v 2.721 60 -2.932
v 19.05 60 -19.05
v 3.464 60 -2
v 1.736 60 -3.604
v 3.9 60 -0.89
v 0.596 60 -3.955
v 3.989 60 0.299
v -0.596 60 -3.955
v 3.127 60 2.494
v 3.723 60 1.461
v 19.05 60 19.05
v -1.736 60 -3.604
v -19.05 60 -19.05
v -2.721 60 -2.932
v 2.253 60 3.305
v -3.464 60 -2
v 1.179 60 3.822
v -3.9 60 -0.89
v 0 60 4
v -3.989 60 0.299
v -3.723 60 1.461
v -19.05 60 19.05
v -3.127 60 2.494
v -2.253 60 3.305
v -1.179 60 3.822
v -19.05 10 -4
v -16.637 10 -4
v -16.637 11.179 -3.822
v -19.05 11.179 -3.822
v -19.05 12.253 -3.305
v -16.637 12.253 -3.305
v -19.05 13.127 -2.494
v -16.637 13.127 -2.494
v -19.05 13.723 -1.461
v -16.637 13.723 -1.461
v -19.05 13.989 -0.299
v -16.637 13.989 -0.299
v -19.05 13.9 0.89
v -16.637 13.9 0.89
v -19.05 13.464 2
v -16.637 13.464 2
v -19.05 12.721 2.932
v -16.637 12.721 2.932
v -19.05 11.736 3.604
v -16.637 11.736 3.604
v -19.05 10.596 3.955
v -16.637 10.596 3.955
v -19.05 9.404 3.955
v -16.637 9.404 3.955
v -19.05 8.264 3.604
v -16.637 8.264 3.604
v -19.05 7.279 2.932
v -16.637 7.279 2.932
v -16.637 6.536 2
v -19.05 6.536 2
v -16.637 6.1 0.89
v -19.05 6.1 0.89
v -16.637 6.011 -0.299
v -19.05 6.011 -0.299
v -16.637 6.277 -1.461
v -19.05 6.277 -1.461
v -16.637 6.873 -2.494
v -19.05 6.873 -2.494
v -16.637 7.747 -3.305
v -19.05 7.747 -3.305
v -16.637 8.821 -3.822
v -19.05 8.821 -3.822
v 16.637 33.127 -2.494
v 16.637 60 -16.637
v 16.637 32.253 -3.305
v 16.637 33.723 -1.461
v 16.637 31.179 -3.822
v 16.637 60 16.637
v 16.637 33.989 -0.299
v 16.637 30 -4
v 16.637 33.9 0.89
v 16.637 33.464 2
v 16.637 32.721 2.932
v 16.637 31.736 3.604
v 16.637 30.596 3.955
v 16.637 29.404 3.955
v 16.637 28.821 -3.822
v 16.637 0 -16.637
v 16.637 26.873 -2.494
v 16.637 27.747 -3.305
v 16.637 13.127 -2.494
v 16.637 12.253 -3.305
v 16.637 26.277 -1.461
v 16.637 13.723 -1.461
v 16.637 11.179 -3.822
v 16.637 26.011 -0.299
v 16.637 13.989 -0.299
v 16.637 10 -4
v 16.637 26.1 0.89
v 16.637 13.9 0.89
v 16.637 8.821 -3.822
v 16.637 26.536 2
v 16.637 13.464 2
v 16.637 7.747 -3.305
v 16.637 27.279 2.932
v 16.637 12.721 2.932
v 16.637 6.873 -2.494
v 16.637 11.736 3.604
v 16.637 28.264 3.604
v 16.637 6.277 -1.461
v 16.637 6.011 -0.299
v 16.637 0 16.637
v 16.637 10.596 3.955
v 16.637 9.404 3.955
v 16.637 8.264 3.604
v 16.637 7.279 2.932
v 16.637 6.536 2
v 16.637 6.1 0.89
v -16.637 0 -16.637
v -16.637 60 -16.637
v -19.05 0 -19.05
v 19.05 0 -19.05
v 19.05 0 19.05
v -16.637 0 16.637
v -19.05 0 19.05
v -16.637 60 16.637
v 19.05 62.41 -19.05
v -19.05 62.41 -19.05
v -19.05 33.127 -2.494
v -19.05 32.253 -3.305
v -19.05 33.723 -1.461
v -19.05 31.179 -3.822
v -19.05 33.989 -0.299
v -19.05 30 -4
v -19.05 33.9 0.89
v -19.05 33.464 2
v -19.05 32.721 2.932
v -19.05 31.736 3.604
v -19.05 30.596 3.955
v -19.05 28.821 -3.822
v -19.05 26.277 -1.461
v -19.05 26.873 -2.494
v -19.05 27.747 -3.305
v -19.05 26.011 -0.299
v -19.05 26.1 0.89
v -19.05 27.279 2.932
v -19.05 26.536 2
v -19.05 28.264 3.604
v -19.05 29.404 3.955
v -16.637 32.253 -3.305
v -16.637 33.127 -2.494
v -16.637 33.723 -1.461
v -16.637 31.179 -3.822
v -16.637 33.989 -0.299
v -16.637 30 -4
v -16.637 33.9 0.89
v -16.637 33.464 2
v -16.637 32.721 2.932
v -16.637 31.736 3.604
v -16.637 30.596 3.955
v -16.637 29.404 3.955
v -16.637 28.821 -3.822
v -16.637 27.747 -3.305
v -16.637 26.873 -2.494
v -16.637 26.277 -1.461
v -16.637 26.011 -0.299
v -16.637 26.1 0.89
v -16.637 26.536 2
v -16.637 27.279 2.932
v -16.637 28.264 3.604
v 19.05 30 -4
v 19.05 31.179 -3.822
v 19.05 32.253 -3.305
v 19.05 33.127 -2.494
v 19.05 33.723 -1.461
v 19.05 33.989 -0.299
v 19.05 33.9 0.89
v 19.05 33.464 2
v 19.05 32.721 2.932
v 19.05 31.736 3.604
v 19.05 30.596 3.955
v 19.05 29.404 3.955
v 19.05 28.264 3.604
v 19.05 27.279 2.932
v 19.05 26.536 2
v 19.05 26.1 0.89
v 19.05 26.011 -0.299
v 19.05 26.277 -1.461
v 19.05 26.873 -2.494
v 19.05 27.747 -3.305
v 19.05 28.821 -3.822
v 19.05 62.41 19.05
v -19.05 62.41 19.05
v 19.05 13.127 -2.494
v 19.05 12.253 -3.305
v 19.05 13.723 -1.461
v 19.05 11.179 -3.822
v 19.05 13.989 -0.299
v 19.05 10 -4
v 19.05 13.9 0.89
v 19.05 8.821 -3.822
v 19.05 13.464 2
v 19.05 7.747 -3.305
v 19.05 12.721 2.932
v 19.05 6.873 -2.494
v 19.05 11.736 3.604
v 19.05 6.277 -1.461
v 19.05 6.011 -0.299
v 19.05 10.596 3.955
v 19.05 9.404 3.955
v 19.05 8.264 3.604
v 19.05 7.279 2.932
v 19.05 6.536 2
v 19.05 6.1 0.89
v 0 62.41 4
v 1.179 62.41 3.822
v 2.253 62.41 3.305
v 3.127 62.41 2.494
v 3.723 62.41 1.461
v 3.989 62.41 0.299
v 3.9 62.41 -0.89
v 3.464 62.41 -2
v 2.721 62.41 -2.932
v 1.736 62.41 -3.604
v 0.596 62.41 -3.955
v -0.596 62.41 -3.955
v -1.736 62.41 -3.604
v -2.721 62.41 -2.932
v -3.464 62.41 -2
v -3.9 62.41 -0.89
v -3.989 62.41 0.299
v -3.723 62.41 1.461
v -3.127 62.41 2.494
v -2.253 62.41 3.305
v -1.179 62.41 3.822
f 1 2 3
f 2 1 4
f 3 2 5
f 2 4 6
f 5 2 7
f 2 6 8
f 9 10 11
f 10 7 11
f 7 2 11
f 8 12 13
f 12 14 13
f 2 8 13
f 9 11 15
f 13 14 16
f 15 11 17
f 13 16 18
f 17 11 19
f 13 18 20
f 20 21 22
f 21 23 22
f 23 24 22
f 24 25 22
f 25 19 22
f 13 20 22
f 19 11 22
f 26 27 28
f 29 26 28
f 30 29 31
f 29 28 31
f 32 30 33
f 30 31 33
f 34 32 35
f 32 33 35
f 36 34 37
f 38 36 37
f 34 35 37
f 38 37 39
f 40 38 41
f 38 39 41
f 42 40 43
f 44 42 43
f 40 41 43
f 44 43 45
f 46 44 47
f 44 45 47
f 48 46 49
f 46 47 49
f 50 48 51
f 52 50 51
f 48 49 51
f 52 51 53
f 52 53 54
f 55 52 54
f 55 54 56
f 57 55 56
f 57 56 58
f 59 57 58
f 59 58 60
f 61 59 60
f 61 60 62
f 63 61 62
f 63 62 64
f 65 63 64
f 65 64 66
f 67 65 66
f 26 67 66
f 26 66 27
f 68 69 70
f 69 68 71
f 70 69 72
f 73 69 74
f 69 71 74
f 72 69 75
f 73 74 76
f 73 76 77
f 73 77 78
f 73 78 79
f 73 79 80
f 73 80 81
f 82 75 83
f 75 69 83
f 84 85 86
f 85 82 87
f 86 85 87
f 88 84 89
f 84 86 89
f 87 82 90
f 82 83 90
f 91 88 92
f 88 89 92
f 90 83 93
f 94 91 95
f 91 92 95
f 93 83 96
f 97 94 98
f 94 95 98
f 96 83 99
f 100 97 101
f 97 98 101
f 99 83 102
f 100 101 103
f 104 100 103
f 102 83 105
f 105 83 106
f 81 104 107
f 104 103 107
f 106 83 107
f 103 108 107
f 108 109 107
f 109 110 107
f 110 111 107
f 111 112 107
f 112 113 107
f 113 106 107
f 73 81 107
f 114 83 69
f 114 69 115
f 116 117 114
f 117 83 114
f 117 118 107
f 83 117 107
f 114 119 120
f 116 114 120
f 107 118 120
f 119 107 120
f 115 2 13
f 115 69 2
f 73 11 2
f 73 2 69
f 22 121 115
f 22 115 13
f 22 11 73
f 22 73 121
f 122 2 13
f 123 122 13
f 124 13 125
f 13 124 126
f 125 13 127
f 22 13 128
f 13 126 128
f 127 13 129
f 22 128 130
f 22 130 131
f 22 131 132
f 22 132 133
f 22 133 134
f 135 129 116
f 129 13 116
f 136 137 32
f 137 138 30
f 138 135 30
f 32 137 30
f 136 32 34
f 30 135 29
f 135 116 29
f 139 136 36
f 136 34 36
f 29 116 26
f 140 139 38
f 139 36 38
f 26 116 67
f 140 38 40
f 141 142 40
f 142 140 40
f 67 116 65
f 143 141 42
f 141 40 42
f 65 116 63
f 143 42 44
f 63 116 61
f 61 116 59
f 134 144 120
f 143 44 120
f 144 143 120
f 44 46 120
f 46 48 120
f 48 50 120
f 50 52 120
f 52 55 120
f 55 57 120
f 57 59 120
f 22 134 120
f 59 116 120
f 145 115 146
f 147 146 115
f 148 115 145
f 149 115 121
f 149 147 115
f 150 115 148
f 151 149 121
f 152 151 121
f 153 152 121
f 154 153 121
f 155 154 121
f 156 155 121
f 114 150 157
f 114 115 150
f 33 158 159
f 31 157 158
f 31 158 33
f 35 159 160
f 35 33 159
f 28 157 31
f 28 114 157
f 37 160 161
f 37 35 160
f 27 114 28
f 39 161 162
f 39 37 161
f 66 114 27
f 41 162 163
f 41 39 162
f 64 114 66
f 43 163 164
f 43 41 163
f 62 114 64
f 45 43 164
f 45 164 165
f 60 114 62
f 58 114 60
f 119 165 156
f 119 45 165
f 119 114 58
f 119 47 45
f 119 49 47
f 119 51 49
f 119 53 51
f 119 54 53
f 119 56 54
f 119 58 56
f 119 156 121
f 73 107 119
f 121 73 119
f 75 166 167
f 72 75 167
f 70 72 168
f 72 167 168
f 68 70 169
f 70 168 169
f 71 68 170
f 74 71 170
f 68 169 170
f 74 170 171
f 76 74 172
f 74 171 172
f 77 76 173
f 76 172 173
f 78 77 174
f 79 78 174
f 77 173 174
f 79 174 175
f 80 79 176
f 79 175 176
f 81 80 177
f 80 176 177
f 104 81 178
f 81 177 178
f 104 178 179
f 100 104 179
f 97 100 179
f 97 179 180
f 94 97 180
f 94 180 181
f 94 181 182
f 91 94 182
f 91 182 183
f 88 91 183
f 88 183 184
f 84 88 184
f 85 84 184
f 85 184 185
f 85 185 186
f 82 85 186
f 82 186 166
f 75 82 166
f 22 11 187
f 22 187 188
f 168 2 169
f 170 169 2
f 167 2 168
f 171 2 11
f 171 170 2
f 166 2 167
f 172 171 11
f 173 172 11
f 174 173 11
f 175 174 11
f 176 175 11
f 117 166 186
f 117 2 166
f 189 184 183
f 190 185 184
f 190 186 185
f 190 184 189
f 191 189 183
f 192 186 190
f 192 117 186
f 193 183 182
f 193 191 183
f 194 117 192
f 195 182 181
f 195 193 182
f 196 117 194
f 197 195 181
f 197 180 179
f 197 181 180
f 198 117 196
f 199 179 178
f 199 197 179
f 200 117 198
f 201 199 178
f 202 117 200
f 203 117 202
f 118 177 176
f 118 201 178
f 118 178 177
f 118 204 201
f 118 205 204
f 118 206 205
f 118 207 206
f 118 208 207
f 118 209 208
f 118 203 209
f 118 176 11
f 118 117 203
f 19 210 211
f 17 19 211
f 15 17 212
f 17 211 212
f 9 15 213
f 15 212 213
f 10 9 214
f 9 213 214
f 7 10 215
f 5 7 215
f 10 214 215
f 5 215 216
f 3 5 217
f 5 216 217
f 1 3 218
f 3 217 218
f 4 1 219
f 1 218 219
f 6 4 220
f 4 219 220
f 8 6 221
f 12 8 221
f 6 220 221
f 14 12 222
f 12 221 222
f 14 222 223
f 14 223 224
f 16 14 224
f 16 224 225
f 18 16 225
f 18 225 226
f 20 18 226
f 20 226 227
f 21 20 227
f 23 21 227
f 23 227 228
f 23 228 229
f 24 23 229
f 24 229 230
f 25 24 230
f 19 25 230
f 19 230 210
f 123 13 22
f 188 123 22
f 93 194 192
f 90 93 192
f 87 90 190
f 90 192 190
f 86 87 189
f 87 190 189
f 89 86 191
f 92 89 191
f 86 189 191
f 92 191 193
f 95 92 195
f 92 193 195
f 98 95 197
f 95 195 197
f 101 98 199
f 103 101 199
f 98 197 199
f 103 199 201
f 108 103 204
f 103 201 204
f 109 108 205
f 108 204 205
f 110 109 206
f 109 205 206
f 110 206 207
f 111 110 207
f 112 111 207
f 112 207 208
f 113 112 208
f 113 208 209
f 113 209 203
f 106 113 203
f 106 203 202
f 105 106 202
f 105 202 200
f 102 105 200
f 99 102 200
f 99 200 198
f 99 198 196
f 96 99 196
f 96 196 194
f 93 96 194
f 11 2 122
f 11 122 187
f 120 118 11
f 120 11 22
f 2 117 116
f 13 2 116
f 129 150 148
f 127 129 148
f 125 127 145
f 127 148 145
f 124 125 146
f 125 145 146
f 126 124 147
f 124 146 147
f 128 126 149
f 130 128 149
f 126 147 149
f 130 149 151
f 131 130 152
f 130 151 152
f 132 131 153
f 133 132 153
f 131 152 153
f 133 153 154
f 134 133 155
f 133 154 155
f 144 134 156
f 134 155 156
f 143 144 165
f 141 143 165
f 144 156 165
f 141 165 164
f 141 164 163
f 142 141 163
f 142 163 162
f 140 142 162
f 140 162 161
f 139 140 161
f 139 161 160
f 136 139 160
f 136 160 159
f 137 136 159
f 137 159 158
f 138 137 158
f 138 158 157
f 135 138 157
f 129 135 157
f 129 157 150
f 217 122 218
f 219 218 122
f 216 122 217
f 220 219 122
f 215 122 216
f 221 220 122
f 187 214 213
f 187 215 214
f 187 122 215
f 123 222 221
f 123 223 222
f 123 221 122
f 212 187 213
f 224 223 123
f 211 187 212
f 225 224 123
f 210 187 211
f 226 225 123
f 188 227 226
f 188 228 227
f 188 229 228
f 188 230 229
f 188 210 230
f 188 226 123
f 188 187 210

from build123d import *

# Parameters (mm, degrees)
SKETCH1_W                                      = 38.1
SKETCH1_H                                      = 38.1
SKETCH1_W_2                                    = 33.274
SKETCH1_H_2                                    = 33.274
TUBO_CUADRADO_AL_AL_TUBE_1_5_SQR_X_0_095_DEPTH = 60
CROQUIS3_R                                     = 4
CORTAR_EXTRUIR1_DEPTH                          = 74.583371083
TAPA_EN_EXTREMO1_THICKNESS                     = 2.41
CROQUIS5_R                                     = 4
CORTAR_EXTRUIR2_DEPTH                          = 10


with BuildPart() as part:
    # Sketch1 → Tubo cuadrado al AL TUBE 1.5 SQR X 0.095 WALL(1) (new body)
    with BuildSketch(Plane(origin=(0, 0, 0), x_dir=(-1, 0, 0), z_dir=(0, 1, 0))):
        Rectangle(SKETCH1_W, SKETCH1_H)
        Rectangle(SKETCH1_W_2, SKETCH1_H_2, mode=Mode.SUBTRACT)
    extrude(amount=TUBO_CUADRADO_AL_AL_TUBE_1_5_SQR_X_0_095_DEPTH)

    # Croquis3 → Cortar-Extruir1 (cut, through all)
    with BuildSketch(Plane(origin=(19.05, 0, 0), x_dir=(0, 0, -1), z_dir=(1, 0, 0))):
        with Locations((0, 10)):
            Circle(CROQUIS3_R)
        with Locations((0, 30)):
            Circle(CROQUIS3_R)
    extrude(amount=-CORTAR_EXTRUIR1_DEPTH, mode=Mode.SUBTRACT)


with BuildPart() as body_2:
    # Tapa en extremo1: an end cap: a plate 2.41 thick on the member's open end, its outline the end's outer outline
    tapa_en_extremo1_end = part.part.faces().sort_by_distance((18.4785, 60, -18.4785))[0]
    add(extrude(Face(tapa_en_extremo1_end.outer_wire()), amount=TAPA_EN_EXTREMO1_THICKNESS, dir=(0, 1, 0)))

    # Croquis5 → Cortar-Extruir2 (cut)
    with BuildSketch(Plane(origin=(0, 62.41, 0), x_dir=(1, 0, 0), z_dir=(0, 1, 0))):
        with Locations(Location((0, 0, 0), (0, 0, 270))):
            Circle(CROQUIS5_R)
    extrude(amount=-CORTAR_EXTRUIR2_DEPTH, mode=Mode.SUBTRACT)


solid = Compound([part.part, body_2.part])
